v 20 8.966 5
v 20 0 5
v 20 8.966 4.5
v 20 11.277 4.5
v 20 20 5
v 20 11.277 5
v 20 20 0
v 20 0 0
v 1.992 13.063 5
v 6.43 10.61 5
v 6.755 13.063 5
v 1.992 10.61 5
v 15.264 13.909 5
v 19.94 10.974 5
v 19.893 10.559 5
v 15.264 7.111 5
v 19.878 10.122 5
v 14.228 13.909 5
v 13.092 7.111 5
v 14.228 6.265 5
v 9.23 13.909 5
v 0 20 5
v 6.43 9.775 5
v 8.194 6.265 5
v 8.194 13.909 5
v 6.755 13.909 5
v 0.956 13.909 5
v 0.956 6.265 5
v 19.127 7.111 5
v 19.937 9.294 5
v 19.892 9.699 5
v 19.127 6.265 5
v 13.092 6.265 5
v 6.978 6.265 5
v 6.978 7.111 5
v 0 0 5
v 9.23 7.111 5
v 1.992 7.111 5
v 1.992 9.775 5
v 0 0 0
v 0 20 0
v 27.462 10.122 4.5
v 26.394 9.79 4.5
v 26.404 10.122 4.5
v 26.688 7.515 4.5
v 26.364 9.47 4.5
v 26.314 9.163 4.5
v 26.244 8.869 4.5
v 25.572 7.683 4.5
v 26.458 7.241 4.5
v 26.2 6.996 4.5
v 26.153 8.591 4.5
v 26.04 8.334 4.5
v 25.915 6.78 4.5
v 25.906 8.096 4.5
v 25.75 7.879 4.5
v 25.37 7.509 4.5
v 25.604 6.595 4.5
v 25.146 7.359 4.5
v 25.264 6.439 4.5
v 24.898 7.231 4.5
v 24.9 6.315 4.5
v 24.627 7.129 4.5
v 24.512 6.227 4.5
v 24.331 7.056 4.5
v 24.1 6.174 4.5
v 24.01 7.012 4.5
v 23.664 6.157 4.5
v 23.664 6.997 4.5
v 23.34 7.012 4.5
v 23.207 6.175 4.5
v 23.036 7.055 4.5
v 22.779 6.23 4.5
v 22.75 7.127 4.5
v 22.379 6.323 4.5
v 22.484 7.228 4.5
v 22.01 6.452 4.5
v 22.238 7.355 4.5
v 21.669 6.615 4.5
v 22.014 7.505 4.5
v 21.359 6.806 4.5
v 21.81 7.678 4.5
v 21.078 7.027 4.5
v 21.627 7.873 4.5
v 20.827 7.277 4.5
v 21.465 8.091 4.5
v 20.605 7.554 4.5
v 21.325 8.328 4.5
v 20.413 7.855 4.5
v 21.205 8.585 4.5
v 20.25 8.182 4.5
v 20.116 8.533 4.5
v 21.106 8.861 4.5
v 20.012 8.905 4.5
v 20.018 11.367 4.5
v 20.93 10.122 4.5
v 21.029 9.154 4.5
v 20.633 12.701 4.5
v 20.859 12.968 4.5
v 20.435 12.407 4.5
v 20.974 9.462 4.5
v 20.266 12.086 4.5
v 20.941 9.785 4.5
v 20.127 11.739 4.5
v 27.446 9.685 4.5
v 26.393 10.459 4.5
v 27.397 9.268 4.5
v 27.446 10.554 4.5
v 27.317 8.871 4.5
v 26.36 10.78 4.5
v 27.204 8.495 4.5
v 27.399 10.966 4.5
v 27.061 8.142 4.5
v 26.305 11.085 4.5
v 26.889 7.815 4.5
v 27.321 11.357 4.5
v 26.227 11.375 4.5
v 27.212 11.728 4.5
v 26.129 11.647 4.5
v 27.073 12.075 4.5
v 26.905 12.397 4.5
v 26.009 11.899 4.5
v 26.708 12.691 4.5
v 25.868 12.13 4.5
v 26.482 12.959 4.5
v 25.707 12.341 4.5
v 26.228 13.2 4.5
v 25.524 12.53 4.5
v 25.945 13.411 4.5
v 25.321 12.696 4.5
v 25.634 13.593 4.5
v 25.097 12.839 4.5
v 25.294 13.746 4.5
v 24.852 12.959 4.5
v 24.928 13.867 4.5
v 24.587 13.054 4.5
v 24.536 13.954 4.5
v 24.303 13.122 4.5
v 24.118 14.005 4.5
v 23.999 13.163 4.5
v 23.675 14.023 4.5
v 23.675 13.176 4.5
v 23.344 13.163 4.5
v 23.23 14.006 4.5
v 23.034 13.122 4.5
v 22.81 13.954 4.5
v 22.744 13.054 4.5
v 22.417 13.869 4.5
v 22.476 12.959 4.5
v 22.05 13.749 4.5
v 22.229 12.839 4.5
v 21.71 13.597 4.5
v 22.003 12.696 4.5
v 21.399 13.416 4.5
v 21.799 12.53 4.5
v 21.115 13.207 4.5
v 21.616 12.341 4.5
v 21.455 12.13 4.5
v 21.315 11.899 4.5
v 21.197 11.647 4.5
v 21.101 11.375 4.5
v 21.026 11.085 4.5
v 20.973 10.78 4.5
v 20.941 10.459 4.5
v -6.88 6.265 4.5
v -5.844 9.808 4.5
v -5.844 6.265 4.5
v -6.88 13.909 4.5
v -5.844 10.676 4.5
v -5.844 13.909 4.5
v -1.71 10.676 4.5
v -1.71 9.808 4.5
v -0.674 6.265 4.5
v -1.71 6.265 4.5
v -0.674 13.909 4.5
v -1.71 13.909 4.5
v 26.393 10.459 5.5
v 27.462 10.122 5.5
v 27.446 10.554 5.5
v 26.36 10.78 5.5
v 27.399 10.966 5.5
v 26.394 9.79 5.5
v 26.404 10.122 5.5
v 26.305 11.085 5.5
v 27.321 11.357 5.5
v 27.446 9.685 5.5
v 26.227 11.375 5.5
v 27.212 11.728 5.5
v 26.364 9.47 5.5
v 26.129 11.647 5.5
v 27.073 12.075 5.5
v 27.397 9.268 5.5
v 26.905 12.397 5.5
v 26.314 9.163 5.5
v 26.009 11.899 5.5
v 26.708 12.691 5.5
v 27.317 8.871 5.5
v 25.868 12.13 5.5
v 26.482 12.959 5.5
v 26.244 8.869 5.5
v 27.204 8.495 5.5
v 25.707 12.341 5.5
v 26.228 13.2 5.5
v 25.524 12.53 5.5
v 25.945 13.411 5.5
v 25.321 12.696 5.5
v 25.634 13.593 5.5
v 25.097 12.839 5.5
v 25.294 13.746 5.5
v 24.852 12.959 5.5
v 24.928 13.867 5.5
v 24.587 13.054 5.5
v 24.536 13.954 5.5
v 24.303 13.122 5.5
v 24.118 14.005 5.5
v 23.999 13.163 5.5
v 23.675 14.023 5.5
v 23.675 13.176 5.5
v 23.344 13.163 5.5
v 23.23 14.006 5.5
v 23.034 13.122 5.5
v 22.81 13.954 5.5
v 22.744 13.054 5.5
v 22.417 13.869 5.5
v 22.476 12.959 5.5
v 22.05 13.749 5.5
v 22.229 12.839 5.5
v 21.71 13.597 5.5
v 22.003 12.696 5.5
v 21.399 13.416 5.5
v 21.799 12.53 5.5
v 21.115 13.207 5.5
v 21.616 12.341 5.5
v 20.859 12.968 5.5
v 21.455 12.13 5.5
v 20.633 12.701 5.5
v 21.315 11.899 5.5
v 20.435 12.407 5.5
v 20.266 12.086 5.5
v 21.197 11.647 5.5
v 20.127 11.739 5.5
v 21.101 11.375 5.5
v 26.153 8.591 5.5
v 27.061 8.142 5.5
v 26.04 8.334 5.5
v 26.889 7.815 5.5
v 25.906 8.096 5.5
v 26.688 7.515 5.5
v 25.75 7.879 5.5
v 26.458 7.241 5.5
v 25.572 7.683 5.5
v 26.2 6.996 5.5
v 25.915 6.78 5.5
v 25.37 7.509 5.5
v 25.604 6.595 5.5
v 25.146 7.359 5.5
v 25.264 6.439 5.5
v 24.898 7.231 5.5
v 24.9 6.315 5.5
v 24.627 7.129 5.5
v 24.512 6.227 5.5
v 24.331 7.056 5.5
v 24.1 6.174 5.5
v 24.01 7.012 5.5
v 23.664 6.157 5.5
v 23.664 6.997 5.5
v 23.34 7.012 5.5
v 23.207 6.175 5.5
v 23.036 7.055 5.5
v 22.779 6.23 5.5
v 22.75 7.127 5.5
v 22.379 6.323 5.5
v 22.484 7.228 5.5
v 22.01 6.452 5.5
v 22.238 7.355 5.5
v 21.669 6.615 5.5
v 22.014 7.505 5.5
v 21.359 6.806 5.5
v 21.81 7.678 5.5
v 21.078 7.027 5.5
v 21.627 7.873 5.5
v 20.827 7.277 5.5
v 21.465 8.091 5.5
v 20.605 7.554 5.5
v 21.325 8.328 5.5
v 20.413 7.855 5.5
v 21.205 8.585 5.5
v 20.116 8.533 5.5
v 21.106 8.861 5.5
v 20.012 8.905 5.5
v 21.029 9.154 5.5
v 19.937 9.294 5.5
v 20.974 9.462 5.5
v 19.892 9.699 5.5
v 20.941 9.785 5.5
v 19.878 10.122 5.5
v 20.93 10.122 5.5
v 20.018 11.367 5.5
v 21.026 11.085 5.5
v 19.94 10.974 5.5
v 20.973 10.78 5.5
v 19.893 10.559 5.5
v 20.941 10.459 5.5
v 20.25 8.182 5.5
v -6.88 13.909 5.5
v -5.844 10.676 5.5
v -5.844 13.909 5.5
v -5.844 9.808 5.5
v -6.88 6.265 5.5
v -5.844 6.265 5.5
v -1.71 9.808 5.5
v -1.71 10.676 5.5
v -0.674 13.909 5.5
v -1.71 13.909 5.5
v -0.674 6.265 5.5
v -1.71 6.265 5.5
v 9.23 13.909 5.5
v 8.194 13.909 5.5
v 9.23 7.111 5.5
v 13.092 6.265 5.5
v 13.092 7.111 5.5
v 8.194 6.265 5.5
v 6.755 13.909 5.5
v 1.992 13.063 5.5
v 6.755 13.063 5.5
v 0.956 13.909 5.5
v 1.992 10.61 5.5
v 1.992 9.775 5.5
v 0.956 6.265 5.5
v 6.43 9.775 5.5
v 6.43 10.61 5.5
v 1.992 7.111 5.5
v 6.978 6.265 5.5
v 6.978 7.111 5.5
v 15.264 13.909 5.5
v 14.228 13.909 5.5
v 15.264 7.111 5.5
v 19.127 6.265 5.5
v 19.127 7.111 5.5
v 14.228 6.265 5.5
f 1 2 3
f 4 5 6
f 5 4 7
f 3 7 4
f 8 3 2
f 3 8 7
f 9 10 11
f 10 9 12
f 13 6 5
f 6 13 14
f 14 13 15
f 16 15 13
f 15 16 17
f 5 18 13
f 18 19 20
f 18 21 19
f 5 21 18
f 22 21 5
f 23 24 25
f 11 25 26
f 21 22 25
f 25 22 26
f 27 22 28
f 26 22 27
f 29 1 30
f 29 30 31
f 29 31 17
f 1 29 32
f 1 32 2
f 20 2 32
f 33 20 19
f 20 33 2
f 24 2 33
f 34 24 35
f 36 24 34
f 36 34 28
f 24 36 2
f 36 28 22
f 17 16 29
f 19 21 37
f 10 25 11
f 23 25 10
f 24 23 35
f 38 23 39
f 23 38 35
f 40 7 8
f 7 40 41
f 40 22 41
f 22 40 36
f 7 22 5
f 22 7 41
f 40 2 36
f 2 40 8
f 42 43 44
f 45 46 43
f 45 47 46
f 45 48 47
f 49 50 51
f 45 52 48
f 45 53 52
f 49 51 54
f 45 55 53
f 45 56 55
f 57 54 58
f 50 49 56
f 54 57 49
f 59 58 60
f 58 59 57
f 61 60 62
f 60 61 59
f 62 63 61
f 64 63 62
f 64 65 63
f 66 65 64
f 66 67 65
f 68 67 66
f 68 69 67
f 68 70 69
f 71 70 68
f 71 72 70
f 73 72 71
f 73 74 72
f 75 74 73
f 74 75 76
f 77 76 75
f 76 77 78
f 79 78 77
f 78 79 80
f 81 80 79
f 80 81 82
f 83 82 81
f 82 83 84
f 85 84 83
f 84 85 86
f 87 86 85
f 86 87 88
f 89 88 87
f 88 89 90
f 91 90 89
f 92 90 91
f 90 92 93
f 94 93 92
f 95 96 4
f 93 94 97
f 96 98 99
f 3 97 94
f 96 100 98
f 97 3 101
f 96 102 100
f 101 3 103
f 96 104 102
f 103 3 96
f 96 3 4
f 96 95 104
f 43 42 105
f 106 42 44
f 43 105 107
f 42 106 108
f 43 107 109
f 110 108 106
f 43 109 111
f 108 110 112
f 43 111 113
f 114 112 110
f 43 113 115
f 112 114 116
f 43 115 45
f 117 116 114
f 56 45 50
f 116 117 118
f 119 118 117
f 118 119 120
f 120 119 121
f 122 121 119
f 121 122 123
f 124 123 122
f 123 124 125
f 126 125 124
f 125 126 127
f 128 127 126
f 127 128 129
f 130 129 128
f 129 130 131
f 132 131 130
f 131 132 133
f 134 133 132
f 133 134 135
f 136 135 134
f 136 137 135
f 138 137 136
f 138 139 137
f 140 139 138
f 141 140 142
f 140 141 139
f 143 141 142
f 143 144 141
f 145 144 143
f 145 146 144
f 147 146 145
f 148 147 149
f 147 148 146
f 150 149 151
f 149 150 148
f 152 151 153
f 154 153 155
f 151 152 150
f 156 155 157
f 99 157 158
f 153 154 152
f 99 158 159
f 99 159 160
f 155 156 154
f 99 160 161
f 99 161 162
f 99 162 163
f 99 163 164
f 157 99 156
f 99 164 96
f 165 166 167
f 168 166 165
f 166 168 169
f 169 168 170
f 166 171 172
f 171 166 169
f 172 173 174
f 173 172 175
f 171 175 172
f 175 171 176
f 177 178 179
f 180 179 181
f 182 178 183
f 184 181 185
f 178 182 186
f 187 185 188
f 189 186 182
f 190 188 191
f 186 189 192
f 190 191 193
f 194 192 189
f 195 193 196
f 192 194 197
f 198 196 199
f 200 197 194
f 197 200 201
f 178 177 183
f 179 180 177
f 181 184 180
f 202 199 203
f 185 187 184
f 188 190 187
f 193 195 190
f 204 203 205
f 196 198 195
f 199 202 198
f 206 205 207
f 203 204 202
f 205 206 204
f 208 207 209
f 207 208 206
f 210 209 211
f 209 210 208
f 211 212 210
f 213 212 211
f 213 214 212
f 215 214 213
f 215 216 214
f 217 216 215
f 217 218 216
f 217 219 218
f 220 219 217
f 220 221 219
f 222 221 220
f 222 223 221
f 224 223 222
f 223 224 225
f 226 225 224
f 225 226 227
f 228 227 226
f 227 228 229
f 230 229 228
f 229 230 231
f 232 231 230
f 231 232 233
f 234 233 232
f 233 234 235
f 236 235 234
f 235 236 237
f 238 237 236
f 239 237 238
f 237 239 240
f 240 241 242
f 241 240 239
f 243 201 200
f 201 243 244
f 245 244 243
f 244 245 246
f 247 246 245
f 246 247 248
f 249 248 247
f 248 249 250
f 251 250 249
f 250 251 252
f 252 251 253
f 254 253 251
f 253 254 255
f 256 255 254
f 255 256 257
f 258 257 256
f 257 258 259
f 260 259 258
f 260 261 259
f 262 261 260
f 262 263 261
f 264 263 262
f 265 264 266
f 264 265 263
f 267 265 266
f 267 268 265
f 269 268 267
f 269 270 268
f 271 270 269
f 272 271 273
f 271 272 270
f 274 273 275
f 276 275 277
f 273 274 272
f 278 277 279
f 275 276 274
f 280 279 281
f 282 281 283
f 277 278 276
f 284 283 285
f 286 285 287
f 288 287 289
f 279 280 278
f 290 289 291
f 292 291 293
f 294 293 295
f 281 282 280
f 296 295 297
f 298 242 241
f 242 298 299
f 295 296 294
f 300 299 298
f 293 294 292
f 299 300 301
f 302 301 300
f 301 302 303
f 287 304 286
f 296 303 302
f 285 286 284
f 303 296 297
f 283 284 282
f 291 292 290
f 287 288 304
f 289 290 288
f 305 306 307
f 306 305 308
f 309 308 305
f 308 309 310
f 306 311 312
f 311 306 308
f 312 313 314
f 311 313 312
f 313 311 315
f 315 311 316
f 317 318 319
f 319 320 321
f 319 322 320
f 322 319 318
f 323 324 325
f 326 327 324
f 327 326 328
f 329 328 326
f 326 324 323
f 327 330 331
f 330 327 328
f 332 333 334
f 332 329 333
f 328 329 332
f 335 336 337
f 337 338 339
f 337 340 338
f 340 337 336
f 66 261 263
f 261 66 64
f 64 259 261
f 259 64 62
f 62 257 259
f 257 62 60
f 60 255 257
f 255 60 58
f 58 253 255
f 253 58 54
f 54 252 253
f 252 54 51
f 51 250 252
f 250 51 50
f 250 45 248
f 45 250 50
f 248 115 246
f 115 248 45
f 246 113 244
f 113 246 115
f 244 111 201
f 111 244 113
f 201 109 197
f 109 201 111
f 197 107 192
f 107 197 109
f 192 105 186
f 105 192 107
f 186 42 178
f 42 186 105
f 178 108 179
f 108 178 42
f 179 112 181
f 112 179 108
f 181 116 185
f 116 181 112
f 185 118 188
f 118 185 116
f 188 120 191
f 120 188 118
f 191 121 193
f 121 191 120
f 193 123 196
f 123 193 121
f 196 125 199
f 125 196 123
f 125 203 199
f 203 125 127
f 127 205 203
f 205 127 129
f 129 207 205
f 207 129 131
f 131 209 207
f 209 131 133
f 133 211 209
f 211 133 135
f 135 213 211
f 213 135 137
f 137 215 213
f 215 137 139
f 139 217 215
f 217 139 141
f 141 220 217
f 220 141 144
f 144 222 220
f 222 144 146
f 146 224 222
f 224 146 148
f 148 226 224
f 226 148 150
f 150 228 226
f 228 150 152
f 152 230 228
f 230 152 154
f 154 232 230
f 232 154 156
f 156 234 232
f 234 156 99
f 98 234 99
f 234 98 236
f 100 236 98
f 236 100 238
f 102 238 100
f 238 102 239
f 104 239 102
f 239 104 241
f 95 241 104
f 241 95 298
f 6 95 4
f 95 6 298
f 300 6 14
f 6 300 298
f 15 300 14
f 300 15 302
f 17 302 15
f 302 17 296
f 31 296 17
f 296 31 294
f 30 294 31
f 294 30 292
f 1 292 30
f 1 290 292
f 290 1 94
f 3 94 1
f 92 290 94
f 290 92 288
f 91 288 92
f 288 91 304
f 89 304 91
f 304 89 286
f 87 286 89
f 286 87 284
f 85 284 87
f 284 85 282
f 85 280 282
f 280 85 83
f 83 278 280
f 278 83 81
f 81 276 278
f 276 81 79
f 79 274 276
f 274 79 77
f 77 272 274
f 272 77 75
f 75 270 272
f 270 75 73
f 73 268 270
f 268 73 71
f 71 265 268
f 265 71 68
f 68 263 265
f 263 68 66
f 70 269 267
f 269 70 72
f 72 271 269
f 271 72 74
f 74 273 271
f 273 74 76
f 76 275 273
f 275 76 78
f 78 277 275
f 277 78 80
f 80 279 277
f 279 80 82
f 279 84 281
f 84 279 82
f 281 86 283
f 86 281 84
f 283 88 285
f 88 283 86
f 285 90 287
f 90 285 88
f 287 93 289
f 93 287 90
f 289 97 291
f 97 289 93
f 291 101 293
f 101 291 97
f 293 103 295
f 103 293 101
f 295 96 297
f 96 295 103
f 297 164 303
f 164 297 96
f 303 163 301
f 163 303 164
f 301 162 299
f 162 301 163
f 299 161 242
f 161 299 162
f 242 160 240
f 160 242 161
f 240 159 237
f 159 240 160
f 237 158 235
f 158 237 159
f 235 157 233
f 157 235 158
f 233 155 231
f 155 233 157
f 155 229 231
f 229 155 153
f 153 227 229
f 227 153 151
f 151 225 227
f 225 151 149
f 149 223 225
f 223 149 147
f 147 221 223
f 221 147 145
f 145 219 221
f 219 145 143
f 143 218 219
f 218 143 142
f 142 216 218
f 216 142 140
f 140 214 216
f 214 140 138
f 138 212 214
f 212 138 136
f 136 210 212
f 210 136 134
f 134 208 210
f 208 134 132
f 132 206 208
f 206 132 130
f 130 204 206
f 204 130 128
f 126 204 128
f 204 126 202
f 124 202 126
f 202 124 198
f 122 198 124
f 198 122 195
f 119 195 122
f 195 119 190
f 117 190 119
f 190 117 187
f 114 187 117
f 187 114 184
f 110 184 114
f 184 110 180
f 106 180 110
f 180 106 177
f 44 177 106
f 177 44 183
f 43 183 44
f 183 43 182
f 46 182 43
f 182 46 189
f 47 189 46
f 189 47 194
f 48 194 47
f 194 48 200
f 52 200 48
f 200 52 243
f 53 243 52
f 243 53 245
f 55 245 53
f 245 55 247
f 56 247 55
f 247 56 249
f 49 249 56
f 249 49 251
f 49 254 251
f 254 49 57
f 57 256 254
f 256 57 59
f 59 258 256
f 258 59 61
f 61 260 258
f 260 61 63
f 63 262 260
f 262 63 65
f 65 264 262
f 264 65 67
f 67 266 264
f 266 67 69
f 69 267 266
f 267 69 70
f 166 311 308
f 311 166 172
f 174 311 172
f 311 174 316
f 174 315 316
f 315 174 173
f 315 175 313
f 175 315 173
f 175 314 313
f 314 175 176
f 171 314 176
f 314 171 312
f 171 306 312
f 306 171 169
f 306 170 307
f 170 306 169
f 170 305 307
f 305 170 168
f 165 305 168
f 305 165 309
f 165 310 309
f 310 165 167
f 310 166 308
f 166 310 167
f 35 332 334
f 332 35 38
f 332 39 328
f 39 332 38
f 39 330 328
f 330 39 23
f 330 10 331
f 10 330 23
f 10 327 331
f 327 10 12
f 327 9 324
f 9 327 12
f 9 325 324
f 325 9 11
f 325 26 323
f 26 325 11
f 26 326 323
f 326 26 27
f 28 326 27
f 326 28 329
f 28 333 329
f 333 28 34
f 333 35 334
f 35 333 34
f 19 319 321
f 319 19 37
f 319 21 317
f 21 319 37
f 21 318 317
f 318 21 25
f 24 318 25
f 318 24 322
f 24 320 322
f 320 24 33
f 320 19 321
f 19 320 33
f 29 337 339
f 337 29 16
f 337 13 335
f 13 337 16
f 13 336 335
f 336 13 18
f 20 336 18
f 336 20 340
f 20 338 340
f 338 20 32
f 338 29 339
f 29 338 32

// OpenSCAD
// Generated by scadwright. Do not hand-edit —
// edit the Python source and regenerate.

union() {
    cube([20, 20, 5], center=false);

    translate([10, 10, 4.5]) {
        linear_extrude(height=1, center=false) {
            text("HELLO", size=8, halign="center", valign="center");
        }
    }
}
